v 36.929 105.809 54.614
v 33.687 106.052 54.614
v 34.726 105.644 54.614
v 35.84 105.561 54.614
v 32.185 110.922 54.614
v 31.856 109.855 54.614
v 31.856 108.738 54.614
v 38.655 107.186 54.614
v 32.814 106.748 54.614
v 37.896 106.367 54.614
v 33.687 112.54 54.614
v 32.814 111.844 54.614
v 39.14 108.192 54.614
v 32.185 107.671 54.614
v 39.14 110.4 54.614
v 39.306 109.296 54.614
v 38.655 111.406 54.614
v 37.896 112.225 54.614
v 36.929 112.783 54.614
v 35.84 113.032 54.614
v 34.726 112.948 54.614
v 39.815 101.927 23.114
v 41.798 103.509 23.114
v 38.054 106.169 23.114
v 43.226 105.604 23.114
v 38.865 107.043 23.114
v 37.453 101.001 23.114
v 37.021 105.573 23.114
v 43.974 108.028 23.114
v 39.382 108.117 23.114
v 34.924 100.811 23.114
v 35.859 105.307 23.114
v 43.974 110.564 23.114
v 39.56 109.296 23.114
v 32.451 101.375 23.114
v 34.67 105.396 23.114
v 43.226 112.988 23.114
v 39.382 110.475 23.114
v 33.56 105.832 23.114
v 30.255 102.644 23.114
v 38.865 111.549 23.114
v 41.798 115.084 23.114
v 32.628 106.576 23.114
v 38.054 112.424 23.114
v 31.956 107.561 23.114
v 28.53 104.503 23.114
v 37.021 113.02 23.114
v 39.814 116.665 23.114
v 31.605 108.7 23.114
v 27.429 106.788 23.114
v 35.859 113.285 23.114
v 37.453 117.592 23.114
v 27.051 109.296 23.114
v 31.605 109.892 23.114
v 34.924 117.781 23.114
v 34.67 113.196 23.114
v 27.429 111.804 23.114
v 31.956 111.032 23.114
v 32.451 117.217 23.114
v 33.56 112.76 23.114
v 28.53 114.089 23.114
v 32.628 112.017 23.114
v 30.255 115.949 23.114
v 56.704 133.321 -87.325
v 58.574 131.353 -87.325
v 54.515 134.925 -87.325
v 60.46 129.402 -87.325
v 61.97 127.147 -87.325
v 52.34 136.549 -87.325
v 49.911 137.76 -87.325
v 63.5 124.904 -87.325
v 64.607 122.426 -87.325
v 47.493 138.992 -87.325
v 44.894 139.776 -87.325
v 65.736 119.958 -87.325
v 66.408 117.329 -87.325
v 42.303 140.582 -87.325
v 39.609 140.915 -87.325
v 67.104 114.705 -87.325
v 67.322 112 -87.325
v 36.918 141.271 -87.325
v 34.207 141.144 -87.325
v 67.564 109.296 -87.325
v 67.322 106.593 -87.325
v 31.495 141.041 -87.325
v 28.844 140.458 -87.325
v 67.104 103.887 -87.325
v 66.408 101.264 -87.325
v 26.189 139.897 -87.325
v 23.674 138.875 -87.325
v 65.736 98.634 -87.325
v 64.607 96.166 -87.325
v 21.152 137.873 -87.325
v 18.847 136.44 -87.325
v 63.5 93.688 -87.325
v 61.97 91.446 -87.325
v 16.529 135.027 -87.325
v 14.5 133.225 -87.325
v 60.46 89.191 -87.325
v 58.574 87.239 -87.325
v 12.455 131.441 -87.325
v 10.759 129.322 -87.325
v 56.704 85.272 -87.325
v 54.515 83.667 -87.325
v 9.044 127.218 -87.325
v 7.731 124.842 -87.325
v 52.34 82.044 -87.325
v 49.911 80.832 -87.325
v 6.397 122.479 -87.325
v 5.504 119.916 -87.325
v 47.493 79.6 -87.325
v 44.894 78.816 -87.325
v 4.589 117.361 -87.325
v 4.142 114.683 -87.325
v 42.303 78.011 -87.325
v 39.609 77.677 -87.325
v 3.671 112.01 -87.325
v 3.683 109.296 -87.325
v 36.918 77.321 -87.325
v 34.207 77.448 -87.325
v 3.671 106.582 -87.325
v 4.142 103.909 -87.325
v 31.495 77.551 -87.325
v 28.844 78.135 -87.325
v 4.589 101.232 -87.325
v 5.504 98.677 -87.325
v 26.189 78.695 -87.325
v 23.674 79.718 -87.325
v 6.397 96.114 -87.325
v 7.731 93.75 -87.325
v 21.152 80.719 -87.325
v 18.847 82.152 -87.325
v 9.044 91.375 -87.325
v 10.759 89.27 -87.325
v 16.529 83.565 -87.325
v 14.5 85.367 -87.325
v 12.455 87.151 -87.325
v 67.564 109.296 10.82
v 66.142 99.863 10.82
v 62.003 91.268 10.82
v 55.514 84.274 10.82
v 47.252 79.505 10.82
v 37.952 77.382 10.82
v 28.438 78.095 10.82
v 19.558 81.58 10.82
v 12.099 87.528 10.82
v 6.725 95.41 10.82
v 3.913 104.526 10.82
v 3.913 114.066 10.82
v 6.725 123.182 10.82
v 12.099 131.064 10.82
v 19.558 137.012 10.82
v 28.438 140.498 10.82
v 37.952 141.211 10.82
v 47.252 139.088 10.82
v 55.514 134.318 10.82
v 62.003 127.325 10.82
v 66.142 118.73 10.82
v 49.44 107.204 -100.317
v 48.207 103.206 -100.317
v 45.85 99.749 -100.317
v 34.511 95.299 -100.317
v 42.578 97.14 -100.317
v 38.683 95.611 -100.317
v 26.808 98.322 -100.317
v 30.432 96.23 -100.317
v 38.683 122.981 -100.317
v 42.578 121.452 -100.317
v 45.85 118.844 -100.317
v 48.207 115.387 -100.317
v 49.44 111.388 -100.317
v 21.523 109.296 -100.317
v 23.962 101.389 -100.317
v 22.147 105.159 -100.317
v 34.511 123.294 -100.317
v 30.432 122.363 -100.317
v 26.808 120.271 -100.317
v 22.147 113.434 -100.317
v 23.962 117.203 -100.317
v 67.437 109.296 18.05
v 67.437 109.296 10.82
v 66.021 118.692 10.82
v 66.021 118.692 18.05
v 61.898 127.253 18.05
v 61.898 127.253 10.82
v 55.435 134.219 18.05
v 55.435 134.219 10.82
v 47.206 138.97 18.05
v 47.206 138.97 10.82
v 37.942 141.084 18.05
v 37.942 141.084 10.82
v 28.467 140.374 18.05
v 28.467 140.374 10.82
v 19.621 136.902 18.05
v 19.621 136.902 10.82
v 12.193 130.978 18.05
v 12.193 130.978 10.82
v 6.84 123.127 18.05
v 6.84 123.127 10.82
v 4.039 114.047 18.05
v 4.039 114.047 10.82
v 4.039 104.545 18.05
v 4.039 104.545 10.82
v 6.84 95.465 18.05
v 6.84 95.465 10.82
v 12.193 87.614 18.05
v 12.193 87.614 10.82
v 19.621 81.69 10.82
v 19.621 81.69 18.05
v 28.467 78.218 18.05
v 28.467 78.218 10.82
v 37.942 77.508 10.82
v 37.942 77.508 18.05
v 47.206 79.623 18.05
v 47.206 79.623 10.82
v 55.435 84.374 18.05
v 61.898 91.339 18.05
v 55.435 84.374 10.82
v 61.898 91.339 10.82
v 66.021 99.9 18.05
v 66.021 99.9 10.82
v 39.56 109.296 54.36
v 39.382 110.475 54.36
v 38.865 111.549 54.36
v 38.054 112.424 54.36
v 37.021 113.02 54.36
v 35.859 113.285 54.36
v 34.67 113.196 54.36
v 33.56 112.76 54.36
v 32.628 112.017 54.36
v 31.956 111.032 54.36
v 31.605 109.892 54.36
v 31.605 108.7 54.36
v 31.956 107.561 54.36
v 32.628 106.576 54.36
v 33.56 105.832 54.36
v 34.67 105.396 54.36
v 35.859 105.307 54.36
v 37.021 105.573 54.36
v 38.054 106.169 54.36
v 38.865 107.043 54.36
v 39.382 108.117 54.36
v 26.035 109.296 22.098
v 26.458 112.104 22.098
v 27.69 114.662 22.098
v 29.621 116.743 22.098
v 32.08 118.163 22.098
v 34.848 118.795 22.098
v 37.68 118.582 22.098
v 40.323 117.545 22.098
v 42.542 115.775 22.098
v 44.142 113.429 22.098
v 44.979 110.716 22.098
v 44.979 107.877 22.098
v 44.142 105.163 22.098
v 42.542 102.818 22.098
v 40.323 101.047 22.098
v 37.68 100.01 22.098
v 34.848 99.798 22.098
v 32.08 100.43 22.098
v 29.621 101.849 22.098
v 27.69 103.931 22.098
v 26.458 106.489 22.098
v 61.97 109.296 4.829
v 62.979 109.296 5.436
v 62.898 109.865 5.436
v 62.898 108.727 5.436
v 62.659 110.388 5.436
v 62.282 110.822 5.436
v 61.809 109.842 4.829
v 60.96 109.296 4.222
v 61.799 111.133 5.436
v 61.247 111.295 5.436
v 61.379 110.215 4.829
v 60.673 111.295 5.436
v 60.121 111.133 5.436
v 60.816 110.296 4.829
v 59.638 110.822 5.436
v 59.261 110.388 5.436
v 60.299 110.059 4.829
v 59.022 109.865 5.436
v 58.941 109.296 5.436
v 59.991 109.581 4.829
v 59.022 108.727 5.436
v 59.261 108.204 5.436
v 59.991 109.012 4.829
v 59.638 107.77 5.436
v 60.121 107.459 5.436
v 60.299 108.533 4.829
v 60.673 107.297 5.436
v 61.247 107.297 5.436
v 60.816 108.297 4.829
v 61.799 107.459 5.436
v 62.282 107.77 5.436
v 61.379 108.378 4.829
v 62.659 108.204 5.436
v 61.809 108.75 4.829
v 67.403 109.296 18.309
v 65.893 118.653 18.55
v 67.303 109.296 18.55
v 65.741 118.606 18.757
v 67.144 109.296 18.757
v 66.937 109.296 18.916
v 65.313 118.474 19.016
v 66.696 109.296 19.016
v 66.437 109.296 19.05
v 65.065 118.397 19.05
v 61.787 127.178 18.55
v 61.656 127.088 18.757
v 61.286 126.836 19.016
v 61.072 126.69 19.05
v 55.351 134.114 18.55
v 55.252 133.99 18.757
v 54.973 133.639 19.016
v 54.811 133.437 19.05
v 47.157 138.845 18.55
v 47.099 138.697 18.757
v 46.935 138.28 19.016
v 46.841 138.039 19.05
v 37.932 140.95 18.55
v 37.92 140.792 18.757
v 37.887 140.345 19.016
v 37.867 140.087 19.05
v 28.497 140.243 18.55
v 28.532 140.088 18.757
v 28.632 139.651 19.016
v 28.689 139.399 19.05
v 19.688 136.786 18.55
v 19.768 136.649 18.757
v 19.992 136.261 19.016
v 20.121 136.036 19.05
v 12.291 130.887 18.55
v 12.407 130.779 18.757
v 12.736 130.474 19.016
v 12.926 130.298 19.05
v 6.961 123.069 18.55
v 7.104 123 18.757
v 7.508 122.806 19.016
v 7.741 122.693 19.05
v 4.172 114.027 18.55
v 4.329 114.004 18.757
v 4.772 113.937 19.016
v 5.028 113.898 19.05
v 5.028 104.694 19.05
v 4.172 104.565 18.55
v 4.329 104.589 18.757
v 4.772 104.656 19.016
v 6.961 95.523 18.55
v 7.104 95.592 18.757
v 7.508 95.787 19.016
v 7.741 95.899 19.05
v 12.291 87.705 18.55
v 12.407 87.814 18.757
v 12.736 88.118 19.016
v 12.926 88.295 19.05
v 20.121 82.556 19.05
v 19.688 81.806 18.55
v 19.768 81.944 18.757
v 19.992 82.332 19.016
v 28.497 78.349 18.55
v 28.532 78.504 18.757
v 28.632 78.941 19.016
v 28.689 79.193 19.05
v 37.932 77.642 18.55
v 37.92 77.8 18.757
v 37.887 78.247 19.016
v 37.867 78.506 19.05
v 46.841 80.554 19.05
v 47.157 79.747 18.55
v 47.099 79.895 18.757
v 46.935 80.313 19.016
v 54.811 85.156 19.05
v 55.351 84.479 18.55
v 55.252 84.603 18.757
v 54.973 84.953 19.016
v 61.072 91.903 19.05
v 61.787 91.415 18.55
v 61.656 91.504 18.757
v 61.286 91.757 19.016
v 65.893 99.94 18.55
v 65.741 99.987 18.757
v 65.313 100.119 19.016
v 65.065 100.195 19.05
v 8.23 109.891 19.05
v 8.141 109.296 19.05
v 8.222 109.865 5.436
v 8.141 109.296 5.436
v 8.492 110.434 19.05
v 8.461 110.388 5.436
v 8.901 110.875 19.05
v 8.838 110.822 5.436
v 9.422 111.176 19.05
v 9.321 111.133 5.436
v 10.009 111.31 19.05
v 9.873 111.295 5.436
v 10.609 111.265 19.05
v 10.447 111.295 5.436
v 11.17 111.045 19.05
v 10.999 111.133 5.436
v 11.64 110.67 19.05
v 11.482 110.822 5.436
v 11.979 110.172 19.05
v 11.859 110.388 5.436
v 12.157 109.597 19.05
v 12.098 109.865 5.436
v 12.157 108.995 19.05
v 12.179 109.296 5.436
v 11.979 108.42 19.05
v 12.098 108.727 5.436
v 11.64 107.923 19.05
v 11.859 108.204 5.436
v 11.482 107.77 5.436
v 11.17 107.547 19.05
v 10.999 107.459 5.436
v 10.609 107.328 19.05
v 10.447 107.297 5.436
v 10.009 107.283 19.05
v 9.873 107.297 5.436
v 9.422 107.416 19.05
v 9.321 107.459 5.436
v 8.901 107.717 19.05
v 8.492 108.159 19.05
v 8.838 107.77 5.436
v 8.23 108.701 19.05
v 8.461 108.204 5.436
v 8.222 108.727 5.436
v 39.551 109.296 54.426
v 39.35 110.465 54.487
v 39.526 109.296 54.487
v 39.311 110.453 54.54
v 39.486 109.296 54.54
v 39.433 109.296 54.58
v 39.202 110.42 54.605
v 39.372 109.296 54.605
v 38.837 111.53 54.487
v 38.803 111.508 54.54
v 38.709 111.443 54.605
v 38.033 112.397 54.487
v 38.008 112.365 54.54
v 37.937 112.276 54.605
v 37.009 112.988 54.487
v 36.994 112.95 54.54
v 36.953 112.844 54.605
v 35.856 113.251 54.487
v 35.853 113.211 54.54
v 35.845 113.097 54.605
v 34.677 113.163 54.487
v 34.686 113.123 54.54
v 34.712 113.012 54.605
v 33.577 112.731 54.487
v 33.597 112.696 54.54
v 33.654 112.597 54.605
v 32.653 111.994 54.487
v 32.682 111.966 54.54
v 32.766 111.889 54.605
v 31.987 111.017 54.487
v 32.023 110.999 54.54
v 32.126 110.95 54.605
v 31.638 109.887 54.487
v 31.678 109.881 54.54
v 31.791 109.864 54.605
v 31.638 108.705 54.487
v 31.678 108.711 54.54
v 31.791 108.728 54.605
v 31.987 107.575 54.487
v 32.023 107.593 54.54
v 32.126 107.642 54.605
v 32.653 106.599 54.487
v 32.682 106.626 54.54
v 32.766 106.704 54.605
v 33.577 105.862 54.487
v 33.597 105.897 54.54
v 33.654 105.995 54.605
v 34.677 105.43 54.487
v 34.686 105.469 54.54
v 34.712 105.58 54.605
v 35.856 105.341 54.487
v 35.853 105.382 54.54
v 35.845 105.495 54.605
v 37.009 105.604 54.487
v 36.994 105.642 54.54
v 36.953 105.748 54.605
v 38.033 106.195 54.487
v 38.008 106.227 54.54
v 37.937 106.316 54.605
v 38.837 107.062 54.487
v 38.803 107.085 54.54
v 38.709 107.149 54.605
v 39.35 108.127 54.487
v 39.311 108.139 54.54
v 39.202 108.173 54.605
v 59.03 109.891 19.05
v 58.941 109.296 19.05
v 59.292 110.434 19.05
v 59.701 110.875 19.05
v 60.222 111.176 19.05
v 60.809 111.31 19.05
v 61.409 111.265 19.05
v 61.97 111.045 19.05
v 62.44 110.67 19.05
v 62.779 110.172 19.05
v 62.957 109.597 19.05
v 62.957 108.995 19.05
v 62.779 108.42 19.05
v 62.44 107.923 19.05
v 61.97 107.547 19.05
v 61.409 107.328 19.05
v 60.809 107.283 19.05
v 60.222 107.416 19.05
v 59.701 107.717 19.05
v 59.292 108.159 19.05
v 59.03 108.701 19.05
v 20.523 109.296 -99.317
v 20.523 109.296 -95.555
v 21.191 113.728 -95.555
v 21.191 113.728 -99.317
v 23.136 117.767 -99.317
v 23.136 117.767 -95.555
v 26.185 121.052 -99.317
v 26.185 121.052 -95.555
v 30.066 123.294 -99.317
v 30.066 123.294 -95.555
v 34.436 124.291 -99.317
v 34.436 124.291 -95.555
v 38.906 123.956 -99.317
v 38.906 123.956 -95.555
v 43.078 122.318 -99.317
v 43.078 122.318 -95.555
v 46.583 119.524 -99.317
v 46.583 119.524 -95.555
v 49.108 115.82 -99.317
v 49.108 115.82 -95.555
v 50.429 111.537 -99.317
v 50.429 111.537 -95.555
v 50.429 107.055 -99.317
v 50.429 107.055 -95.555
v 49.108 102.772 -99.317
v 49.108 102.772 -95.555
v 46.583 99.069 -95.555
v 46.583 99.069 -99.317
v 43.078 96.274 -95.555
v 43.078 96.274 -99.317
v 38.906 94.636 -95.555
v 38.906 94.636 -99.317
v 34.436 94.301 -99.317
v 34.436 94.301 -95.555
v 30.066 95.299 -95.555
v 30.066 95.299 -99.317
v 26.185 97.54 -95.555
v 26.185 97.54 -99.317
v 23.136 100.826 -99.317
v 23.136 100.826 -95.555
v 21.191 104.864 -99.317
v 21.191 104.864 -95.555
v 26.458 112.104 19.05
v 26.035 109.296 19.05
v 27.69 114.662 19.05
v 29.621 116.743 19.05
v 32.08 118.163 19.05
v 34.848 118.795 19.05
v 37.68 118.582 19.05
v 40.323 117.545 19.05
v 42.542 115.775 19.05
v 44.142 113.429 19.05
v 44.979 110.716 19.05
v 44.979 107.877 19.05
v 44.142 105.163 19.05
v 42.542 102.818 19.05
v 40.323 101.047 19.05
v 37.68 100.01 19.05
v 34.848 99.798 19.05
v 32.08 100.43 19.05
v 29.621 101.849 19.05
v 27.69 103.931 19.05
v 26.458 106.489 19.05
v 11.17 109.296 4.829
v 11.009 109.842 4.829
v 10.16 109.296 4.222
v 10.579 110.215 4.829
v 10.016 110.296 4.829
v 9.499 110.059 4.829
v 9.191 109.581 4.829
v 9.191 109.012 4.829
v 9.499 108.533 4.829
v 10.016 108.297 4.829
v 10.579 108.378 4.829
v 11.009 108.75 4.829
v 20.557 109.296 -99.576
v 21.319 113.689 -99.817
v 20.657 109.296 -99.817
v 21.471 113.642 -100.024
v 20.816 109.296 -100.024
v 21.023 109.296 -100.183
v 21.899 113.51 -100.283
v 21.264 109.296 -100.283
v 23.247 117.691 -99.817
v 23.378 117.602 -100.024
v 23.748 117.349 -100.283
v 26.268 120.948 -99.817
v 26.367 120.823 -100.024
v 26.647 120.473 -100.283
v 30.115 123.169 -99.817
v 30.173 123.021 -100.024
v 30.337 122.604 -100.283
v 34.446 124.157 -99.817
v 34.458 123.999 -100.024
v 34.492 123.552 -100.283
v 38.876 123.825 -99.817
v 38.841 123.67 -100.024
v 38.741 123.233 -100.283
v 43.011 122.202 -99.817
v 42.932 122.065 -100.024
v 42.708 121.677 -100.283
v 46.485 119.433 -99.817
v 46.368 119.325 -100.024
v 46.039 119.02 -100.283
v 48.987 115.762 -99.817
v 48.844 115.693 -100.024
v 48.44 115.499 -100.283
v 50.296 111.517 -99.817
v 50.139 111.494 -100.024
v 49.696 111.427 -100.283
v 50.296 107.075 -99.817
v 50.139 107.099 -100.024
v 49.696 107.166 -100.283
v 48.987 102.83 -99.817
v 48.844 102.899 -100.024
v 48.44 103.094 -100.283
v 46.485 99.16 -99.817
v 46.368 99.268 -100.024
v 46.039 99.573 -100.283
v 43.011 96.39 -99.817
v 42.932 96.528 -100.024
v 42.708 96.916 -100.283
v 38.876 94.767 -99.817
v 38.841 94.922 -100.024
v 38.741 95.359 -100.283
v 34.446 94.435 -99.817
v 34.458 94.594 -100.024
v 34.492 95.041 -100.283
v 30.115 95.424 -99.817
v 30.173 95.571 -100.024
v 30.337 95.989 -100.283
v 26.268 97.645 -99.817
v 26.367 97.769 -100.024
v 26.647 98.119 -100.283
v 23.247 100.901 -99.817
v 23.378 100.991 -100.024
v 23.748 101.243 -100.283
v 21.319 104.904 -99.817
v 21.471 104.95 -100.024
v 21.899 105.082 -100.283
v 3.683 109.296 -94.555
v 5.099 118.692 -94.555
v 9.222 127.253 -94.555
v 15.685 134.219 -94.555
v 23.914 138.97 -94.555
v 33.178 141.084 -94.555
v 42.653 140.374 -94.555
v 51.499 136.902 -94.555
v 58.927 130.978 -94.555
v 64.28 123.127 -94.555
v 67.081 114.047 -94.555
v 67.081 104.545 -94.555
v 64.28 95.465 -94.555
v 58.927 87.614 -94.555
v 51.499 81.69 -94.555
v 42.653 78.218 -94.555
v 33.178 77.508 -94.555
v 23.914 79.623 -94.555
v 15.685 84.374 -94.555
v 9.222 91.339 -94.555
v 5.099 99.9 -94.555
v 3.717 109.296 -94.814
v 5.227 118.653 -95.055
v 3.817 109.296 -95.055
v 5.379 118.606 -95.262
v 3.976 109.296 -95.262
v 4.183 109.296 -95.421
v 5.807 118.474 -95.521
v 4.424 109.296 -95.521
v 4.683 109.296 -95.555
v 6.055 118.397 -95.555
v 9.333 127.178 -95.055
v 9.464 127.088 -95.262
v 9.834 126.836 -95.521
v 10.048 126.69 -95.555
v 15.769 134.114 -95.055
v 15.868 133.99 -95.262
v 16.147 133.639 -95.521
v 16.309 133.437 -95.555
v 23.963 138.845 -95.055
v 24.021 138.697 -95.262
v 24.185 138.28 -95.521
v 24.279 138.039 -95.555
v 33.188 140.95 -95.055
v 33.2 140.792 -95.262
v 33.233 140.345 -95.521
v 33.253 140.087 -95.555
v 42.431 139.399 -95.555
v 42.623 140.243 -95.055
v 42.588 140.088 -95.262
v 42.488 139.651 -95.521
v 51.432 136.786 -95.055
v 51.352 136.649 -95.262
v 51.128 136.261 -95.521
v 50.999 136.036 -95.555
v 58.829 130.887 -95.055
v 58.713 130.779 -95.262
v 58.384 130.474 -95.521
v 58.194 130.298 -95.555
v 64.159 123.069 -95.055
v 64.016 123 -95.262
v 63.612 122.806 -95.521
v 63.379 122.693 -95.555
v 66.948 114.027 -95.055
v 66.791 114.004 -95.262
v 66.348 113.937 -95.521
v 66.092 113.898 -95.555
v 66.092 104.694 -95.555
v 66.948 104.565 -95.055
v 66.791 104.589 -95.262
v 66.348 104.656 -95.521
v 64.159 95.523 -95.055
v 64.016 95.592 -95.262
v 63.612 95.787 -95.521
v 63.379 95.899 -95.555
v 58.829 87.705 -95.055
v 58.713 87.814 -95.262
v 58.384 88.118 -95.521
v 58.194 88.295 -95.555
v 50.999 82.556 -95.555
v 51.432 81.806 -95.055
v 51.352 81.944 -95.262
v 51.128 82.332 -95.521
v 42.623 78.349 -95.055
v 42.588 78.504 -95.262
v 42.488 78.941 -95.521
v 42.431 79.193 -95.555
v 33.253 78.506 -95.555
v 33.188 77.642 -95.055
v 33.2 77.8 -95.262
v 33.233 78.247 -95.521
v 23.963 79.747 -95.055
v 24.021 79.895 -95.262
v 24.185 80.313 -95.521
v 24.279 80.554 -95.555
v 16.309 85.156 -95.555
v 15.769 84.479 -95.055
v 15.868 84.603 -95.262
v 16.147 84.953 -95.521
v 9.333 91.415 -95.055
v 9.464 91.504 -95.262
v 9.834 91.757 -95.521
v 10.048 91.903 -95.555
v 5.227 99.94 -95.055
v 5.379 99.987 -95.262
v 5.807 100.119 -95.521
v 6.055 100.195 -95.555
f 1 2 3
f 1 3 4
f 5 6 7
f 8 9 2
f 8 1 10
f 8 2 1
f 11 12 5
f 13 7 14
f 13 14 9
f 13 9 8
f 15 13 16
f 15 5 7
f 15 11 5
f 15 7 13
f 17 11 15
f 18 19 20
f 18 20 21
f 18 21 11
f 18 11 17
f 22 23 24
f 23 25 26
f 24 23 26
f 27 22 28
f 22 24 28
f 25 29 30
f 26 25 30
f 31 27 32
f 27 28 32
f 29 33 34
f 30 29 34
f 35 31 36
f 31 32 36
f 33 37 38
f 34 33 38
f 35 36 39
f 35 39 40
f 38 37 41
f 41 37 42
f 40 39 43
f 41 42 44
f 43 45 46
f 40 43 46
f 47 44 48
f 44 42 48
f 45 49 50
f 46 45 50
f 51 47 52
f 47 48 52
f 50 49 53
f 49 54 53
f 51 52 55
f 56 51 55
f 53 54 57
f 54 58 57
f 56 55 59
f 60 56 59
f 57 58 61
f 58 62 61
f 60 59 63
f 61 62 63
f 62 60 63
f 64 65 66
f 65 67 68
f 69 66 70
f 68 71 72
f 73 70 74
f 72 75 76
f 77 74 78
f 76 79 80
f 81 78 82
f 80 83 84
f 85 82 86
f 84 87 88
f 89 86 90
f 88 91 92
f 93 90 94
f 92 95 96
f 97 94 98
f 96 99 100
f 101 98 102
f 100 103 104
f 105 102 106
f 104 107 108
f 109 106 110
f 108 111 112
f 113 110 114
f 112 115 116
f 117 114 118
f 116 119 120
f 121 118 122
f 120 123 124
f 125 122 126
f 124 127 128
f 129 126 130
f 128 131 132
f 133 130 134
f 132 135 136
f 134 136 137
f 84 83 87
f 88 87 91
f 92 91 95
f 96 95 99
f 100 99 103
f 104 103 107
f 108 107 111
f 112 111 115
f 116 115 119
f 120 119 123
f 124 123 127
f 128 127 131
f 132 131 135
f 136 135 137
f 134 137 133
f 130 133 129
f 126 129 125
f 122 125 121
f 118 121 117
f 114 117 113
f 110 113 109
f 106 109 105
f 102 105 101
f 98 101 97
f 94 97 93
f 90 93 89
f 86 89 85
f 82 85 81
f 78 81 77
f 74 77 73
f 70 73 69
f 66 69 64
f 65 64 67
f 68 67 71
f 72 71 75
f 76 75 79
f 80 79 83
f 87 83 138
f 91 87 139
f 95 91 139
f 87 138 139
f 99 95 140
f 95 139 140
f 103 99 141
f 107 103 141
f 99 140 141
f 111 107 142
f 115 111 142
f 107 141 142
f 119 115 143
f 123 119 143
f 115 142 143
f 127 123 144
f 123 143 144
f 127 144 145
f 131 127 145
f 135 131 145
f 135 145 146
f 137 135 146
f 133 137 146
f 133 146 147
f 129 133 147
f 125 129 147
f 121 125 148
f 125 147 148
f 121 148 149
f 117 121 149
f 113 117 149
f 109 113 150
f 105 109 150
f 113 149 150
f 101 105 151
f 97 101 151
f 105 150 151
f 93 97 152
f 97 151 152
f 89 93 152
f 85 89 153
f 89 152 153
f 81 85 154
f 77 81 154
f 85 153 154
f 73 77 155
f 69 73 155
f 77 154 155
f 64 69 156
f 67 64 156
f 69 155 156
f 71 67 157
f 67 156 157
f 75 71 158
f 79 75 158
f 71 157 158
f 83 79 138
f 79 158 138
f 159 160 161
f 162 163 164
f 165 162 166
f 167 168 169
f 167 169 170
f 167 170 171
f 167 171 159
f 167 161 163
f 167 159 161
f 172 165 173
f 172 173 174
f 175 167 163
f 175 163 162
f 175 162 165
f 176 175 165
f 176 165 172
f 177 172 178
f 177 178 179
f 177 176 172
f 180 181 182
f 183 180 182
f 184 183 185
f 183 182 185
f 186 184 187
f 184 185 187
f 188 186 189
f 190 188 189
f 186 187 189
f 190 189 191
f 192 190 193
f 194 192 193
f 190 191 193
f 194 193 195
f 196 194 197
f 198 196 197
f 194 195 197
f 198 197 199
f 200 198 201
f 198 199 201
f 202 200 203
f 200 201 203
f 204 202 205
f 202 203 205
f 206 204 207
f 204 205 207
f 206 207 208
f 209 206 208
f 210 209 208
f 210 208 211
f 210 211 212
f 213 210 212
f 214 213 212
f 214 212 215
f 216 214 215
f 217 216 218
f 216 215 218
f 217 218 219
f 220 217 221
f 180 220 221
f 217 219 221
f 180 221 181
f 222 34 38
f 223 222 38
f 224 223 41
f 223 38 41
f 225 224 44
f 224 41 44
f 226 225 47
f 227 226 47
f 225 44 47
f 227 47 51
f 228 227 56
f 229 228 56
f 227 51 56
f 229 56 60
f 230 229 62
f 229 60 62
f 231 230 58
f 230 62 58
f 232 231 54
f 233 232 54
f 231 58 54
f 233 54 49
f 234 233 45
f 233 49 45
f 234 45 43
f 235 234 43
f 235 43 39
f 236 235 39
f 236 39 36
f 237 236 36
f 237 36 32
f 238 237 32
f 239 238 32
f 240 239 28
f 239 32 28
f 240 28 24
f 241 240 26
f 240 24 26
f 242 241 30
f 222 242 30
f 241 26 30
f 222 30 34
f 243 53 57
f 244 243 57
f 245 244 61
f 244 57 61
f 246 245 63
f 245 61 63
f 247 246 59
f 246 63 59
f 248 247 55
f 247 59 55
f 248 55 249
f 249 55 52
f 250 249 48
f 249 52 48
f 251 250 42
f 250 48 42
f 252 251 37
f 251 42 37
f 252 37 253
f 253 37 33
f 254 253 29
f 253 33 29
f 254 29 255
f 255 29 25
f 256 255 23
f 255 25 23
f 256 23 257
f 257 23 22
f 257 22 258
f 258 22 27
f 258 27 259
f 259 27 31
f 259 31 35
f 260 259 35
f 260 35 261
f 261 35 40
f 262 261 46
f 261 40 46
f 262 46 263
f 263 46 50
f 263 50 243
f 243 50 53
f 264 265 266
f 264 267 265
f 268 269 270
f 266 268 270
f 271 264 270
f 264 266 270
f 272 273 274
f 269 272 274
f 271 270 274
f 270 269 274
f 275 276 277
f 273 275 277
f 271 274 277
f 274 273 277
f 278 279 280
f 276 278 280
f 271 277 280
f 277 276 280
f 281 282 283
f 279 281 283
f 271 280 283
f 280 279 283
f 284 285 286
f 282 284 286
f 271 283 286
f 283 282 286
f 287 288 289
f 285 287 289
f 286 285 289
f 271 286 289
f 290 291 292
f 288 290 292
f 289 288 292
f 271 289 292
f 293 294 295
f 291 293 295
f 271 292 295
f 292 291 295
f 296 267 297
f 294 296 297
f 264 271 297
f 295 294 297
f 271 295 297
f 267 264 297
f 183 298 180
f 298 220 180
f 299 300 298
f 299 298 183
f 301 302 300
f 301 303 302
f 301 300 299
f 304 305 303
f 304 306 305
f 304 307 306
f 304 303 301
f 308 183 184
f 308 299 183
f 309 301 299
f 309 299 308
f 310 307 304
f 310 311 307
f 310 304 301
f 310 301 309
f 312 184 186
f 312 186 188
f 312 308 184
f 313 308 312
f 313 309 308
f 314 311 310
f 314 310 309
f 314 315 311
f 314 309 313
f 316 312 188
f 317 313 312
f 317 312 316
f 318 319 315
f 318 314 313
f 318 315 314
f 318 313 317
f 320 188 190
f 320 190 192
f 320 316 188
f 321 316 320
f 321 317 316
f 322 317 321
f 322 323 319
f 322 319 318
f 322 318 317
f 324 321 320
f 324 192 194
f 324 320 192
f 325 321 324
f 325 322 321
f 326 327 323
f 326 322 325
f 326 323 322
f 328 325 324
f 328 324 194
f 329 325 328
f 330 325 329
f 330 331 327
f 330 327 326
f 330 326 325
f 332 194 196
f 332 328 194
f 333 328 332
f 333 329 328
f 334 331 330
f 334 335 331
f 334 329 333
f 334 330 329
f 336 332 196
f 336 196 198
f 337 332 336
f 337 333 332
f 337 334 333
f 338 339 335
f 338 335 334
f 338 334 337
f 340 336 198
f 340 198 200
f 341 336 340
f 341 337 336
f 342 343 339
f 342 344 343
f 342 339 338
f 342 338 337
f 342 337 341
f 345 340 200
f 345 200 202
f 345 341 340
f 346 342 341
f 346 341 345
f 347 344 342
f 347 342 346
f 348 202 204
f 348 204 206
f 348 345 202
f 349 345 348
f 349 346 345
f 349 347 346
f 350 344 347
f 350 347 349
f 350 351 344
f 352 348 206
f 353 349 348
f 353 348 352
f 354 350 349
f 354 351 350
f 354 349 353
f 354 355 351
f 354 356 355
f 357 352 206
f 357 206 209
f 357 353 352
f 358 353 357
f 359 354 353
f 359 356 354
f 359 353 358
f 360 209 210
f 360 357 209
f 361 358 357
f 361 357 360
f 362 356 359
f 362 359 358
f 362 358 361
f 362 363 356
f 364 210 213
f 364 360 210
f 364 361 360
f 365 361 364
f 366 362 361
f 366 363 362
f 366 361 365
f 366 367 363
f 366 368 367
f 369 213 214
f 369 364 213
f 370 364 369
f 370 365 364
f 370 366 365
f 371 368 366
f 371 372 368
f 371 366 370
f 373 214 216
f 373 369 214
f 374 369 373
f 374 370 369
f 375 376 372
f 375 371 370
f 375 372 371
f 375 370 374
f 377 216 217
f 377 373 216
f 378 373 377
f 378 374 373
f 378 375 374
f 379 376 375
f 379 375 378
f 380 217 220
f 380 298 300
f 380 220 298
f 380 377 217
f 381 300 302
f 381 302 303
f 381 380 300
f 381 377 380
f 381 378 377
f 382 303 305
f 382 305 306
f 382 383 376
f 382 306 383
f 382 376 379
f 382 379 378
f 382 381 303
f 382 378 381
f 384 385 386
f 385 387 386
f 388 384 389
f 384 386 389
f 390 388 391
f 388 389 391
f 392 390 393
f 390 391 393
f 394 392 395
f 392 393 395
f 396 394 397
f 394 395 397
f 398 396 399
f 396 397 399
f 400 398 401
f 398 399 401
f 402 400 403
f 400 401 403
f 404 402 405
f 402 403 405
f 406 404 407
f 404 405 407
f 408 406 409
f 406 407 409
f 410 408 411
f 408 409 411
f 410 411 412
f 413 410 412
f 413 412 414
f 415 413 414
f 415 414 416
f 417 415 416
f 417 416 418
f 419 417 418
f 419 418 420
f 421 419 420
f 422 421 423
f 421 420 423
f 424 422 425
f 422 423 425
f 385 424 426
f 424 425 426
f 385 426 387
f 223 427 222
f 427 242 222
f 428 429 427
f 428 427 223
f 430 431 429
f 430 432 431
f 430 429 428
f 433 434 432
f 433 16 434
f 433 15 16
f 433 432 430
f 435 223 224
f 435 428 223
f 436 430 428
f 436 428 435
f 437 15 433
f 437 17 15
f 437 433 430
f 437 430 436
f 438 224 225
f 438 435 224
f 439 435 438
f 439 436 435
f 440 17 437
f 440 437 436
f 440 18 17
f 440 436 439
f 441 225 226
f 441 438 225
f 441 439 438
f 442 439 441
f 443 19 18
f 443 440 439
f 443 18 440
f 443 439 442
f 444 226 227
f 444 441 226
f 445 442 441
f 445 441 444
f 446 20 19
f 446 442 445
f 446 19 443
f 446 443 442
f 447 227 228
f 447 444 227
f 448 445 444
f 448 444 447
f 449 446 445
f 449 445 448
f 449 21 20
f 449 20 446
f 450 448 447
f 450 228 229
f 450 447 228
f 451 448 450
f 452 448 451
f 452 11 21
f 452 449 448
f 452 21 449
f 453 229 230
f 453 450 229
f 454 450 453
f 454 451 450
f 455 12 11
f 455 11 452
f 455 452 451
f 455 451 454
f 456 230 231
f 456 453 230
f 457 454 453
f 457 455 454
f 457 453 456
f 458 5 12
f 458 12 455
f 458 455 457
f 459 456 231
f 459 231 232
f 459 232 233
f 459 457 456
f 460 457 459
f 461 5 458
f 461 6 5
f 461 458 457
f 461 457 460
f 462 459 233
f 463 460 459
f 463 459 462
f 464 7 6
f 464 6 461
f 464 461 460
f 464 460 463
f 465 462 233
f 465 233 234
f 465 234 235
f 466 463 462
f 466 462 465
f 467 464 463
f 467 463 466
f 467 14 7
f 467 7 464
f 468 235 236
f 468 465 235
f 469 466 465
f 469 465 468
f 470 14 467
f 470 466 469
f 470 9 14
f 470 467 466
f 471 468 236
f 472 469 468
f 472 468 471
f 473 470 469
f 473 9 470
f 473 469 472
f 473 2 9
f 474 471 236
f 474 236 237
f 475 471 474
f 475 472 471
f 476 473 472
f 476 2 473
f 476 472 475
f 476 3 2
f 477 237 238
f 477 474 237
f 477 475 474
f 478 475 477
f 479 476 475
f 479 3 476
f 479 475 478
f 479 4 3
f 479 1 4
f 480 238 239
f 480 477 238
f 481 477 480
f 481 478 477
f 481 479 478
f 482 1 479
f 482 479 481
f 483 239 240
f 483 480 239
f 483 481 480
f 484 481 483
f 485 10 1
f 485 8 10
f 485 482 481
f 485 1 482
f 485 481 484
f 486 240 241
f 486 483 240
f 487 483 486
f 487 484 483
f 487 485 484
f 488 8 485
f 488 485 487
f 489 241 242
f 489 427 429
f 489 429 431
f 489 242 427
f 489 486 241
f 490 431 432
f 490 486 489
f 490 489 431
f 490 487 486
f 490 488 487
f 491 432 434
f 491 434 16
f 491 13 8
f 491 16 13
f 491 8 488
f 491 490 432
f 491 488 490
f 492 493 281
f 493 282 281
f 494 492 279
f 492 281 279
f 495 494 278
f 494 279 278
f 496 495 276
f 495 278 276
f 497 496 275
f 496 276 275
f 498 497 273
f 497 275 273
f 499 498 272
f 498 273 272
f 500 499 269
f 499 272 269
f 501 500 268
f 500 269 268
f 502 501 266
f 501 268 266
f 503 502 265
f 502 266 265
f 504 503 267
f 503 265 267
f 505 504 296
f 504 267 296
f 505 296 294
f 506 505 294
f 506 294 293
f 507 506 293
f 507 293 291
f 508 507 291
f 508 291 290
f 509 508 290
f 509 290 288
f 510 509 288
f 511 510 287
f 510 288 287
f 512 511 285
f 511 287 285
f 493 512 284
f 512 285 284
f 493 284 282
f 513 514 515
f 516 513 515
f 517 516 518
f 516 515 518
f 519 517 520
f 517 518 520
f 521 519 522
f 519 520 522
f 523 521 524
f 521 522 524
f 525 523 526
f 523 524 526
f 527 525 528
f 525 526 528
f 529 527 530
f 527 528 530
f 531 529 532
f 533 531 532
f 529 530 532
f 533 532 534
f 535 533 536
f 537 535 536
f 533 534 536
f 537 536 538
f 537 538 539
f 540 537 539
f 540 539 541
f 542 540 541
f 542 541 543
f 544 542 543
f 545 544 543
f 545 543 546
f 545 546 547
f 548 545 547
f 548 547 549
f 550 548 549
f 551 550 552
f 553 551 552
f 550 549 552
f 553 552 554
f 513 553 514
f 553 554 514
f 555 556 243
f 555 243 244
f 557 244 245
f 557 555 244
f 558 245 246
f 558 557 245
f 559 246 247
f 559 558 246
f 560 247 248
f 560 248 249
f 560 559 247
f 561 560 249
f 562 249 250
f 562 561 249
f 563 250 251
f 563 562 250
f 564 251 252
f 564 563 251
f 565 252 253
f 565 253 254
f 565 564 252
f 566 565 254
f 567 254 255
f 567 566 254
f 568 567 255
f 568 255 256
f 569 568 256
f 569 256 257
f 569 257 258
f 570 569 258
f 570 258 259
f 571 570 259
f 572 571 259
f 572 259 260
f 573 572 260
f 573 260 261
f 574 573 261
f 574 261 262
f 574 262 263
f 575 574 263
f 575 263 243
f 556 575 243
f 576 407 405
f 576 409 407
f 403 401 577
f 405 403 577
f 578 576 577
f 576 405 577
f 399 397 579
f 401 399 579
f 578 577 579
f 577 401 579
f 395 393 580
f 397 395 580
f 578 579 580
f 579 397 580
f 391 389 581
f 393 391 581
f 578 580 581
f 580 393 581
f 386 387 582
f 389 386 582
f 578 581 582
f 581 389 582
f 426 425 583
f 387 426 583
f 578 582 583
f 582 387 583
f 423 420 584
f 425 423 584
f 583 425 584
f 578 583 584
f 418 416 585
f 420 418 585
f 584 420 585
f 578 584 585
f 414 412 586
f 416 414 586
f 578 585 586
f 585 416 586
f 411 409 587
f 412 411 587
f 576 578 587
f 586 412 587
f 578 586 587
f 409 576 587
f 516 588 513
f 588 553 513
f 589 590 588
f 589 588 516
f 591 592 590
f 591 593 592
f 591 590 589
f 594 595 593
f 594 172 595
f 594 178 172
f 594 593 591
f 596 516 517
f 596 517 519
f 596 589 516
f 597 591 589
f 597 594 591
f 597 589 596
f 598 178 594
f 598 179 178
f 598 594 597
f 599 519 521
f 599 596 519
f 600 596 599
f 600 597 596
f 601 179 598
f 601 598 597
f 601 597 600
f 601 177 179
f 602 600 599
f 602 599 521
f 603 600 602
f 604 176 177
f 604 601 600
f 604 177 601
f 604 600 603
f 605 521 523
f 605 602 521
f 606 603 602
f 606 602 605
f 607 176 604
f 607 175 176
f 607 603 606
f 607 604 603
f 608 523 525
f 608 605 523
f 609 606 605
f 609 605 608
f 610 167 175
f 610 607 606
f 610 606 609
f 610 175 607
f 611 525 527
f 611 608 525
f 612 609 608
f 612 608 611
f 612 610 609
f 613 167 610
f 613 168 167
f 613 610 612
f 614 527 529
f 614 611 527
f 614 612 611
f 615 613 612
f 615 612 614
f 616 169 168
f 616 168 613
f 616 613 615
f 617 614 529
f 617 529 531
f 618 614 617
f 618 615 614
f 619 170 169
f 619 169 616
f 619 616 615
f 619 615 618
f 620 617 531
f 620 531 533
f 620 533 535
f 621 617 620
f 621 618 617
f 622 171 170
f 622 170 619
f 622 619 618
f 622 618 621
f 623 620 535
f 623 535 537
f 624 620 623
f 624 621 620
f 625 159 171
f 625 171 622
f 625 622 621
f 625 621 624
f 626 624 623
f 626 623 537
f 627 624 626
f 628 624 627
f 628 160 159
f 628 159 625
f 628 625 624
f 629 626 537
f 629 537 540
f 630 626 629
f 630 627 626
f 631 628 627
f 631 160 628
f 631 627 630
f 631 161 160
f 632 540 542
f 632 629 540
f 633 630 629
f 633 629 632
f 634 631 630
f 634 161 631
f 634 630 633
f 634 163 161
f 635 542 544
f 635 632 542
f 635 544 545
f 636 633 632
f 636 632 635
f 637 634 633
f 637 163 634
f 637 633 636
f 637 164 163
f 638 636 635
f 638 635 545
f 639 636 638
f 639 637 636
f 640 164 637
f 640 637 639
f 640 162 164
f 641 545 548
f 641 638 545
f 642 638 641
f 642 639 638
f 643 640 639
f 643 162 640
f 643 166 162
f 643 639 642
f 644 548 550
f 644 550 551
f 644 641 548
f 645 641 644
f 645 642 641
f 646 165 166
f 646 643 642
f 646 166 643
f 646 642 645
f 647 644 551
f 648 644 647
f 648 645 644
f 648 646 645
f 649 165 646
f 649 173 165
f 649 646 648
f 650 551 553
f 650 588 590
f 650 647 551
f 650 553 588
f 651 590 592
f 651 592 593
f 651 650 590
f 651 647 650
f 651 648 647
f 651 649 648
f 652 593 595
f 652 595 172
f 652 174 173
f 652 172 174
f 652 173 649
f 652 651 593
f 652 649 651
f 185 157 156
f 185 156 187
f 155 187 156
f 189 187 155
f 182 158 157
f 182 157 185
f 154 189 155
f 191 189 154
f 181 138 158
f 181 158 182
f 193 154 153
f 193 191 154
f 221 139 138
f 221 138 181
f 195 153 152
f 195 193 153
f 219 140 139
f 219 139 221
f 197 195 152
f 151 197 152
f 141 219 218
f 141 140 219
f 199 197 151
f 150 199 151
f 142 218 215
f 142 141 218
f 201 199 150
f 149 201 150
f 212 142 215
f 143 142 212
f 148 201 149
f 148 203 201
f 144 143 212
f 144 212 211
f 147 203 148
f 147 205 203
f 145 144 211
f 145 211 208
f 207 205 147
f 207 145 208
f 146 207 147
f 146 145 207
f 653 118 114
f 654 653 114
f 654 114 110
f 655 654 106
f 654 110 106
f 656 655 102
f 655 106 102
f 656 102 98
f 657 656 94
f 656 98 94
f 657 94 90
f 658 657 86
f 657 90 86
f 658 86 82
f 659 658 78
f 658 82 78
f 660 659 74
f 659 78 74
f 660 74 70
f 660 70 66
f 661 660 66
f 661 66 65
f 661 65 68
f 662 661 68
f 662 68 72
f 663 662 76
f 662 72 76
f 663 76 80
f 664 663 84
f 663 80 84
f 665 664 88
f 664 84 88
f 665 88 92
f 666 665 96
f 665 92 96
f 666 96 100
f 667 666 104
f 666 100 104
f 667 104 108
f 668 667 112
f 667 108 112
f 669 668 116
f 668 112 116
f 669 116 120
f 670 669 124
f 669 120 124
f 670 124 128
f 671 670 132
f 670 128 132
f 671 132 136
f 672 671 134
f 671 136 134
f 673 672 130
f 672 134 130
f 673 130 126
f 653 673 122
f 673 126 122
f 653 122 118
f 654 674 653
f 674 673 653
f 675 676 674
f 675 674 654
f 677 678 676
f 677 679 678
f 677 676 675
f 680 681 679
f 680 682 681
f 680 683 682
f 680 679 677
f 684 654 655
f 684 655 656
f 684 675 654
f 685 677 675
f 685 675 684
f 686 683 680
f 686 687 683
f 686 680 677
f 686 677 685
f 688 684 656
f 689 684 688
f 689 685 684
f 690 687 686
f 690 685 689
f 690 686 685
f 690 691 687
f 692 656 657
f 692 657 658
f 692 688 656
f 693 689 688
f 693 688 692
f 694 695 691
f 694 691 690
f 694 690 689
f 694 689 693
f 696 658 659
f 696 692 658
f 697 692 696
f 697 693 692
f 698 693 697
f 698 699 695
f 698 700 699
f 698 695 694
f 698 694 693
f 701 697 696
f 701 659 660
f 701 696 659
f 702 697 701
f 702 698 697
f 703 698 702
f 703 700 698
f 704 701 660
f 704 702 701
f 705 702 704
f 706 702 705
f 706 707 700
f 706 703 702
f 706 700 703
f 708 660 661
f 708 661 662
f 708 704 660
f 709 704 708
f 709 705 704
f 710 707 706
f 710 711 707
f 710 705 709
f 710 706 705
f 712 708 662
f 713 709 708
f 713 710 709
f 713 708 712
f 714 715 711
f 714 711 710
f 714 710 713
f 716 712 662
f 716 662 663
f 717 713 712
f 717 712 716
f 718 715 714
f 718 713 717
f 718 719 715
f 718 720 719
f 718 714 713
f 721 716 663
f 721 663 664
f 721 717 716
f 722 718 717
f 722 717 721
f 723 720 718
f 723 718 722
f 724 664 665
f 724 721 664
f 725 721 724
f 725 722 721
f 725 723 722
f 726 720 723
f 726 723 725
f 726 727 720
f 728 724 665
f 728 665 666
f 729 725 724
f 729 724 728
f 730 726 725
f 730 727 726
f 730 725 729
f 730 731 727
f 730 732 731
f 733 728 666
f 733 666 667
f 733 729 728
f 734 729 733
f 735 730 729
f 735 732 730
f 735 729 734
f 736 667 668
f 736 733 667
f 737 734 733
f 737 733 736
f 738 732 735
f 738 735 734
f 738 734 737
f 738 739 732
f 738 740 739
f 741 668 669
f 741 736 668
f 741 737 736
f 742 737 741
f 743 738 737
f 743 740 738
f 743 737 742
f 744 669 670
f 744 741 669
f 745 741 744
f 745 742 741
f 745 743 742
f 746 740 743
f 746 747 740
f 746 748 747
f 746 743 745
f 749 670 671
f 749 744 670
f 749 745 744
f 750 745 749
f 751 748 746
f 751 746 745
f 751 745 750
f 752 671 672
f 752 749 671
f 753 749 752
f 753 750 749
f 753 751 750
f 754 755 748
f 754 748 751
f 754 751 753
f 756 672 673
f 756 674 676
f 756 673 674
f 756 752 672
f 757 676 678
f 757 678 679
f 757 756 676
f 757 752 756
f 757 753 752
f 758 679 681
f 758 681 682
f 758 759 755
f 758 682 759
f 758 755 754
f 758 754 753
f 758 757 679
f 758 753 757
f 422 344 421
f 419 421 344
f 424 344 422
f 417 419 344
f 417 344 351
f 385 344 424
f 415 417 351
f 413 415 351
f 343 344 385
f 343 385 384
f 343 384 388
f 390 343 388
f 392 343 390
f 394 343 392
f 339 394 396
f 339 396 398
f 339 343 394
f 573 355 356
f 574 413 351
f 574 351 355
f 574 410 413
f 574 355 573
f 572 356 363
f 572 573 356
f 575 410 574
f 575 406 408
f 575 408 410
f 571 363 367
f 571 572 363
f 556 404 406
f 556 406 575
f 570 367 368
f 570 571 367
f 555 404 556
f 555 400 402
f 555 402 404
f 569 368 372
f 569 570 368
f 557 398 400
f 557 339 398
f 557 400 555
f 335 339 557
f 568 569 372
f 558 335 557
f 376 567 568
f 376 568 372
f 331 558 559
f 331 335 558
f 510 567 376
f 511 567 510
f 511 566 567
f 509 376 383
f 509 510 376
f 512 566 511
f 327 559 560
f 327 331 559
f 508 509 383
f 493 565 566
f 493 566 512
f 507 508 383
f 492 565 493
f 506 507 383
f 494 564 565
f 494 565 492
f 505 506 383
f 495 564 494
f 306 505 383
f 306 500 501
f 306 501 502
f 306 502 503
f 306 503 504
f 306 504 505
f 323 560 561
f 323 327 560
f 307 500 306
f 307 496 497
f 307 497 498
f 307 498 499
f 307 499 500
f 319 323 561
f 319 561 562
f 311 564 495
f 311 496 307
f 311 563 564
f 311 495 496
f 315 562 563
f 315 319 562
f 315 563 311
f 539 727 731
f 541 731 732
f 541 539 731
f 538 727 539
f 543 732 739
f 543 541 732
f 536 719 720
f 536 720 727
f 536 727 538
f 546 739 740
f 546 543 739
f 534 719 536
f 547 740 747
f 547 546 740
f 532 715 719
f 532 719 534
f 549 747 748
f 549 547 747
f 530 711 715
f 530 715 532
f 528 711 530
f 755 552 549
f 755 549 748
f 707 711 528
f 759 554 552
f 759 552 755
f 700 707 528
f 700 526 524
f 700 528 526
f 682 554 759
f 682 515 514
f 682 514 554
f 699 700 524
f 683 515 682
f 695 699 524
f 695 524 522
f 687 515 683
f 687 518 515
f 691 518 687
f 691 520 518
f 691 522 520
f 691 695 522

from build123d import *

# Parameters (mm, degrees)
SKETCH1_W           = 32.004
SKETCH1_H           = 98.1456
SKETCH2_R           = 31.877
BOSS_EXTRUDE1_DEPTH = 8.2296
SKETCH5_R           = 9.525
BOSS_EXTRUDE2_DEPTH = 4.572
SKETCH6_R           = 4
BOSS_EXTRUDE3_DEPTH = 31.5
BOSS_EXTRUDE4_START = 8.2296
SKETCH8_R           = 31.877
BOSS_EXTRUDE4_DEPTH = 8.2296
SKETCH9_R           = 15.0368
BOSS_EXTRUDE5_DEPTH = 4.7625
HOLE2_D             = 4.0386
HOLE2_DEPTH         = 13.6144
HOLE2_TIP           = 1.213317848
HOLE3_D             = 4.0386
HOLE3_DEPTH         = 13.6144
HOLE3_TIP           = 1.213317848
CHAMFER1_SIZE       = 1.015999998
CHAMFER1_SIZE2      = 1.016
FILLET1_R           = 0.254
FILLET2_R           = 1
FILLET3_R           = 1
FILLET4_R           = 1


with BuildPart() as part:
    # Sketch1 → Revolve1 (revolve)
    with BuildSketch(Plane.XZ.offset(-109.2962)):
        with Locations((51.562, -38.2524)):
            Rectangle(SKETCH1_W, SKETCH1_H)
    revolve(axis=Axis((35.56, 109.2962, 10.8204), (0, 0, -1)))

    # Sketch2 → Boss-Extrude1 (add)
    with BuildSketch(Plane.XY.offset(10.8204)):
        with Locations((35.56, 109.2962)):
            Circle(SKETCH2_R)
    extrude(amount=BOSS_EXTRUDE1_DEPTH)

    # Sketch5 → Boss-Extrude2 (add)
    with BuildSketch(Plane(origin=(0, 0, 18.542), x_dir=(-1, 0, 0), z_dir=(0, 0, -1))):
        with Locations((-35.56, 109.2962)):
            Circle(SKETCH5_R)
    extrude(amount=-BOSS_EXTRUDE2_DEPTH)

    # Sketch6 → Boss-Extrude3 (add)
    with BuildSketch(Plane.XY.offset(23.114)):
        with Locations((35.56, 109.2962)):
            Circle(SKETCH6_R)
    extrude(amount=BOSS_EXTRUDE3_DEPTH)

    # Sketch8 → Boss-Extrude4 (add)
    with BuildSketch(Plane(origin=(0, 0, -87.3252), x_dir=(-1, 0, 0), z_dir=(0, 0, -1)).offset(BOSS_EXTRUDE4_START)):
        with Locations((-35.56, 109.2962)):
            Circle(SKETCH8_R)
    extrude(amount=-BOSS_EXTRUDE4_DEPTH)

    # Sketch9 → Boss-Extrude5 (add)
    with BuildSketch(Plane(origin=(0, 0, -95.5548), x_dir=(-1, 0, 0), z_dir=(0, 0, -1))):
        with Locations((-35.56, 109.2962)):
            Circle(SKETCH9_R)
    extrude(amount=BOSS_EXTRUDE5_DEPTH)

    # Hole2
    with Locations(Plane.XY.offset(19.05)):
        with Locations((60.96, 109.2962)):
            Hole(HOLE2_D / 2, depth=HOLE2_DEPTH)
            with Locations((0, 0, -(HOLE2_DEPTH + HOLE2_TIP / 2))):  # 118° drill point
                Cone(0, HOLE2_D / 2, HOLE2_TIP, mode=Mode.SUBTRACT)

    # Hole3
    with Locations(Plane.XY.offset(19.05)):
        with Locations((10.16, 109.2962)):
            Hole(HOLE3_D / 2, depth=HOLE3_DEPTH)
            with Locations((0, 0, -(HOLE3_DEPTH + HOLE3_TIP / 2))):  # 118° drill point
                Cone(0, HOLE3_D / 2, HOLE3_TIP, mode=Mode.SUBTRACT)

    # Chamfer1
    chamfer1_edges = [part.edges().sort_by_distance(p)[0] for p in [
        (45.085, 109.2962, 23.114),
    ]]
    chamfer1_side = [part.faces().sort_by_distance(p)[0] for p in [
        (44.815592316, 109.2962, 23.114),
    ]]
    chamfer(chamfer1_edges, length=CHAMFER1_SIZE, length2=CHAMFER1_SIZE2, reference=chamfer1_side[0])

    # Fillet1
    fillet1_edges = [part.edges().sort_by_distance(p)[0] for p in [
        (31.56, 109.2962, 54.614),
    ]]
    fillet(fillet1_edges, radius=FILLET1_R)

    # Fillet2
    fillet2_edges = [part.edges().sort_by_distance(p)[0] for p in [
        (67.437, 109.2962, -95.5548),
    ]]
    fillet(fillet2_edges, radius=FILLET2_R)

    # Fillet3
    fillet3_edges = [part.edges().sort_by_distance(p)[0] for p in [
        (3.683, 109.2962, 19.05),
    ]]
    fillet(fillet3_edges, radius=FILLET3_R)

    # Fillet4
    fillet4_edges = [part.edges().sort_by_distance(p)[0] for p in [
        (50.5968, 109.2962, -100.3173),
    ]]
    fillet(fillet4_edges, radius=FILLET4_R)


solid = part.part
